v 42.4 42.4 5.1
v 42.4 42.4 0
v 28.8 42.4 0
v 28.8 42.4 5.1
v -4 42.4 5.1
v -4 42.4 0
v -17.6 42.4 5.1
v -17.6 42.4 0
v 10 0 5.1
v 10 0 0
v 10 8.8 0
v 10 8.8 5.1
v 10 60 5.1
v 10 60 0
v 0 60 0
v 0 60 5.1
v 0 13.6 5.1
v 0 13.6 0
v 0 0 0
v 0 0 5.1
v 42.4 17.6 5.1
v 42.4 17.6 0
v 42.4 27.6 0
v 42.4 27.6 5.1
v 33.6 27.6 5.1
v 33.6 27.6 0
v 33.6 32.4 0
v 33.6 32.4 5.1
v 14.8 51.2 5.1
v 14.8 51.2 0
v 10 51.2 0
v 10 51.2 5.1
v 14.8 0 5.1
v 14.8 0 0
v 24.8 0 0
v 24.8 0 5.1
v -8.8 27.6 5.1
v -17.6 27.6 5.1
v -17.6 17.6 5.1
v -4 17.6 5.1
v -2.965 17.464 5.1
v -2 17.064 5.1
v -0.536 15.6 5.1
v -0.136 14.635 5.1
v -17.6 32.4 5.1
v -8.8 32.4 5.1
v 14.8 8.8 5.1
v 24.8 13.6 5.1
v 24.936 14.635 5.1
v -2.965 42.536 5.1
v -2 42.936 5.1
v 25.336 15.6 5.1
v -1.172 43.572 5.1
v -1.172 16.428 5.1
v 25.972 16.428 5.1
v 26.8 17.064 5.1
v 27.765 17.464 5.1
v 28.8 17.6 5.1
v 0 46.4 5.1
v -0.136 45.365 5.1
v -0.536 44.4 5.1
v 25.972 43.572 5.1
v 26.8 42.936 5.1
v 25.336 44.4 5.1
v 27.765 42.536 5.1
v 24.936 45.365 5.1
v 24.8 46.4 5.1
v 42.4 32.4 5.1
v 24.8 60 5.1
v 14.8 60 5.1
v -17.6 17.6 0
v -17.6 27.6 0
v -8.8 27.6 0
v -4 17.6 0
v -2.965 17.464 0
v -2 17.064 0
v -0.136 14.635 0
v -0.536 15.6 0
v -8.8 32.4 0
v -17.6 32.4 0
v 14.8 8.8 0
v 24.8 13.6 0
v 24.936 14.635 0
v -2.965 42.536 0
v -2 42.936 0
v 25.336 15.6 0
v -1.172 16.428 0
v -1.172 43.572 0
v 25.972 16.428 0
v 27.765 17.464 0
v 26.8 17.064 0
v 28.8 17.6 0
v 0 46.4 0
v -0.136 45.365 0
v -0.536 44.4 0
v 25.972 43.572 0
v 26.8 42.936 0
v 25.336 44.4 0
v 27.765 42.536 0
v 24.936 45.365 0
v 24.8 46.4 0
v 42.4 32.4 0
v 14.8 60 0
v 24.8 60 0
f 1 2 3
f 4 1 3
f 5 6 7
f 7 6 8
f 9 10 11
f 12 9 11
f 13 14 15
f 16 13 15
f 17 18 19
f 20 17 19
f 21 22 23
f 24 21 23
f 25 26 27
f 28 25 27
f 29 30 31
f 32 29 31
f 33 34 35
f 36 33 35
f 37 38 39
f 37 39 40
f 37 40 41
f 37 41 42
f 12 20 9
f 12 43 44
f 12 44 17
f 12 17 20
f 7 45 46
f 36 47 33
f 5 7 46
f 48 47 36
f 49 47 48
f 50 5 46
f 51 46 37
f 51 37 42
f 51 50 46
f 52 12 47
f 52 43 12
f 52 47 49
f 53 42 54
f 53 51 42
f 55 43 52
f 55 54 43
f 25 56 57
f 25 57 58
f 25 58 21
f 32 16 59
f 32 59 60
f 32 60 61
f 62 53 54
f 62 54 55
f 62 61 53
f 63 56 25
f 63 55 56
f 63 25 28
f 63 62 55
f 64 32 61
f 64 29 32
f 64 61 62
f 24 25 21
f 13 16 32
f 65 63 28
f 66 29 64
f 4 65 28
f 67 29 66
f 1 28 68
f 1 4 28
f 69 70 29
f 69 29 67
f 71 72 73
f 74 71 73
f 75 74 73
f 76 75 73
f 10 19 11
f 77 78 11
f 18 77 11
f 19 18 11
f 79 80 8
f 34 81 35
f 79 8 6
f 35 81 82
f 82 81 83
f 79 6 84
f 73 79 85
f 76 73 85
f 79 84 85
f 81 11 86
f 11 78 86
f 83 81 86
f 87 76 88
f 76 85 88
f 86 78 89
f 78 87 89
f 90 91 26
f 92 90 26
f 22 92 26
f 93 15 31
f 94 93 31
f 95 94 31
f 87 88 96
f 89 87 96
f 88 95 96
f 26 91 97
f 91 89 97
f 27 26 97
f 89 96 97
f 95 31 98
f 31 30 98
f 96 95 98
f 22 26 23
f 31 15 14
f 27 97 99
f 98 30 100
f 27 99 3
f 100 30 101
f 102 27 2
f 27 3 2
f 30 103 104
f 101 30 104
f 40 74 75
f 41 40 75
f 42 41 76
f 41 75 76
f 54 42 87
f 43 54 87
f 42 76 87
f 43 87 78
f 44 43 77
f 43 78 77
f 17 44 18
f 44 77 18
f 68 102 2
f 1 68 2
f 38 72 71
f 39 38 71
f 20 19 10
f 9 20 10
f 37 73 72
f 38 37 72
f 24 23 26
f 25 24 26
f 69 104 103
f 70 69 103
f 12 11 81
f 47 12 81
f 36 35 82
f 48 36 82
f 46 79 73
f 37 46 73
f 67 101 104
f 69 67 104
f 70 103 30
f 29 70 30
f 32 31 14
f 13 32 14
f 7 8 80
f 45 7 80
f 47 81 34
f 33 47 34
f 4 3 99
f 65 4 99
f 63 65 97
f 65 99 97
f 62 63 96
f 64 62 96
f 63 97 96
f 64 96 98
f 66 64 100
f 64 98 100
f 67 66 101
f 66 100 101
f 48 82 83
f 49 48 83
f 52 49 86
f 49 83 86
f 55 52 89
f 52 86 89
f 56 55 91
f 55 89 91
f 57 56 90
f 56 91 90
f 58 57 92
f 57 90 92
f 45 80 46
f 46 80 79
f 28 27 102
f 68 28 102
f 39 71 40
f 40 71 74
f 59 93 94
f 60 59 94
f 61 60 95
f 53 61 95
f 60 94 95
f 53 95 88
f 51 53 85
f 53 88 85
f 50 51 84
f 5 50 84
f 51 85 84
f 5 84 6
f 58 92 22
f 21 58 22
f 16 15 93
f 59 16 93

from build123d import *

# Parameters (mm, degrees)
SALIENTE_EXTRUIR1_DEPTH = 5.1


with BuildPart() as part:
    # Croquis1 → Saliente-Extruir1 (new body)
    with BuildSketch(Plane.XY):
        with BuildLine():
            Line((0, 0), (10, 0))
            Line((10, 0), (10, 8.8))
            Line((10, 8.8), (14.8, 8.8))
            Line((14.8, 8.8), (14.8, 0))
            Line((14.8, 0), (24.8, 0))
            Line((24.8, 0), (24.8, 13.6))
            ThreePointArc((24.8, 13.6), (25.971572875, 16.428427125), (28.8, 17.6))
            Line((28.8, 17.6), (42.4, 17.6))
            Line((42.4, 17.6), (42.4, 27.6))
            Line((42.4, 27.6), (33.6, 27.6))
            Line((33.6, 27.6), (33.6, 32.4))
            Line((33.6, 32.4), (42.4, 32.4))
            Line((42.4, 32.4), (42.4, 42.4))
            Line((42.4, 42.4), (28.8, 42.4))
            ThreePointArc((28.8, 42.4), (25.971572875, 43.571572875), (24.8, 46.4))
            Line((24.8, 46.4), (24.8, 60))
            Line((24.8, 60), (14.8, 60))
            Line((14.8, 60), (14.8, 51.2))
            Line((14.8, 51.2), (10, 51.2))
            Line((10, 51.2), (10, 60))
            Line((10, 60), (0, 60))
            Line((0, 60), (0, 46.4))
            ThreePointArc((0, 46.4), (-1.171572875, 43.571572875), (-4, 42.4))
            Line((-4, 42.4), (-17.6, 42.4))
            Line((-17.6, 42.4), (-17.6, 32.4))
            Line((-17.6, 32.4), (-8.8, 32.4))
            Line((-8.8, 32.4), (-8.8, 27.6))
            Line((-8.8, 27.6), (-17.6, 27.6))
            Line((-17.6, 27.6), (-17.6, 17.6))
            Line((-17.6, 17.6), (-4, 17.6))
            ThreePointArc((-4, 17.6), (-1.171572875, 16.428427125), (0, 13.6))
            Line((0, 13.6), (0, 0))
        make_face()
    extrude(amount=SALIENTE_EXTRUIR1_DEPTH)


solid = part.part
